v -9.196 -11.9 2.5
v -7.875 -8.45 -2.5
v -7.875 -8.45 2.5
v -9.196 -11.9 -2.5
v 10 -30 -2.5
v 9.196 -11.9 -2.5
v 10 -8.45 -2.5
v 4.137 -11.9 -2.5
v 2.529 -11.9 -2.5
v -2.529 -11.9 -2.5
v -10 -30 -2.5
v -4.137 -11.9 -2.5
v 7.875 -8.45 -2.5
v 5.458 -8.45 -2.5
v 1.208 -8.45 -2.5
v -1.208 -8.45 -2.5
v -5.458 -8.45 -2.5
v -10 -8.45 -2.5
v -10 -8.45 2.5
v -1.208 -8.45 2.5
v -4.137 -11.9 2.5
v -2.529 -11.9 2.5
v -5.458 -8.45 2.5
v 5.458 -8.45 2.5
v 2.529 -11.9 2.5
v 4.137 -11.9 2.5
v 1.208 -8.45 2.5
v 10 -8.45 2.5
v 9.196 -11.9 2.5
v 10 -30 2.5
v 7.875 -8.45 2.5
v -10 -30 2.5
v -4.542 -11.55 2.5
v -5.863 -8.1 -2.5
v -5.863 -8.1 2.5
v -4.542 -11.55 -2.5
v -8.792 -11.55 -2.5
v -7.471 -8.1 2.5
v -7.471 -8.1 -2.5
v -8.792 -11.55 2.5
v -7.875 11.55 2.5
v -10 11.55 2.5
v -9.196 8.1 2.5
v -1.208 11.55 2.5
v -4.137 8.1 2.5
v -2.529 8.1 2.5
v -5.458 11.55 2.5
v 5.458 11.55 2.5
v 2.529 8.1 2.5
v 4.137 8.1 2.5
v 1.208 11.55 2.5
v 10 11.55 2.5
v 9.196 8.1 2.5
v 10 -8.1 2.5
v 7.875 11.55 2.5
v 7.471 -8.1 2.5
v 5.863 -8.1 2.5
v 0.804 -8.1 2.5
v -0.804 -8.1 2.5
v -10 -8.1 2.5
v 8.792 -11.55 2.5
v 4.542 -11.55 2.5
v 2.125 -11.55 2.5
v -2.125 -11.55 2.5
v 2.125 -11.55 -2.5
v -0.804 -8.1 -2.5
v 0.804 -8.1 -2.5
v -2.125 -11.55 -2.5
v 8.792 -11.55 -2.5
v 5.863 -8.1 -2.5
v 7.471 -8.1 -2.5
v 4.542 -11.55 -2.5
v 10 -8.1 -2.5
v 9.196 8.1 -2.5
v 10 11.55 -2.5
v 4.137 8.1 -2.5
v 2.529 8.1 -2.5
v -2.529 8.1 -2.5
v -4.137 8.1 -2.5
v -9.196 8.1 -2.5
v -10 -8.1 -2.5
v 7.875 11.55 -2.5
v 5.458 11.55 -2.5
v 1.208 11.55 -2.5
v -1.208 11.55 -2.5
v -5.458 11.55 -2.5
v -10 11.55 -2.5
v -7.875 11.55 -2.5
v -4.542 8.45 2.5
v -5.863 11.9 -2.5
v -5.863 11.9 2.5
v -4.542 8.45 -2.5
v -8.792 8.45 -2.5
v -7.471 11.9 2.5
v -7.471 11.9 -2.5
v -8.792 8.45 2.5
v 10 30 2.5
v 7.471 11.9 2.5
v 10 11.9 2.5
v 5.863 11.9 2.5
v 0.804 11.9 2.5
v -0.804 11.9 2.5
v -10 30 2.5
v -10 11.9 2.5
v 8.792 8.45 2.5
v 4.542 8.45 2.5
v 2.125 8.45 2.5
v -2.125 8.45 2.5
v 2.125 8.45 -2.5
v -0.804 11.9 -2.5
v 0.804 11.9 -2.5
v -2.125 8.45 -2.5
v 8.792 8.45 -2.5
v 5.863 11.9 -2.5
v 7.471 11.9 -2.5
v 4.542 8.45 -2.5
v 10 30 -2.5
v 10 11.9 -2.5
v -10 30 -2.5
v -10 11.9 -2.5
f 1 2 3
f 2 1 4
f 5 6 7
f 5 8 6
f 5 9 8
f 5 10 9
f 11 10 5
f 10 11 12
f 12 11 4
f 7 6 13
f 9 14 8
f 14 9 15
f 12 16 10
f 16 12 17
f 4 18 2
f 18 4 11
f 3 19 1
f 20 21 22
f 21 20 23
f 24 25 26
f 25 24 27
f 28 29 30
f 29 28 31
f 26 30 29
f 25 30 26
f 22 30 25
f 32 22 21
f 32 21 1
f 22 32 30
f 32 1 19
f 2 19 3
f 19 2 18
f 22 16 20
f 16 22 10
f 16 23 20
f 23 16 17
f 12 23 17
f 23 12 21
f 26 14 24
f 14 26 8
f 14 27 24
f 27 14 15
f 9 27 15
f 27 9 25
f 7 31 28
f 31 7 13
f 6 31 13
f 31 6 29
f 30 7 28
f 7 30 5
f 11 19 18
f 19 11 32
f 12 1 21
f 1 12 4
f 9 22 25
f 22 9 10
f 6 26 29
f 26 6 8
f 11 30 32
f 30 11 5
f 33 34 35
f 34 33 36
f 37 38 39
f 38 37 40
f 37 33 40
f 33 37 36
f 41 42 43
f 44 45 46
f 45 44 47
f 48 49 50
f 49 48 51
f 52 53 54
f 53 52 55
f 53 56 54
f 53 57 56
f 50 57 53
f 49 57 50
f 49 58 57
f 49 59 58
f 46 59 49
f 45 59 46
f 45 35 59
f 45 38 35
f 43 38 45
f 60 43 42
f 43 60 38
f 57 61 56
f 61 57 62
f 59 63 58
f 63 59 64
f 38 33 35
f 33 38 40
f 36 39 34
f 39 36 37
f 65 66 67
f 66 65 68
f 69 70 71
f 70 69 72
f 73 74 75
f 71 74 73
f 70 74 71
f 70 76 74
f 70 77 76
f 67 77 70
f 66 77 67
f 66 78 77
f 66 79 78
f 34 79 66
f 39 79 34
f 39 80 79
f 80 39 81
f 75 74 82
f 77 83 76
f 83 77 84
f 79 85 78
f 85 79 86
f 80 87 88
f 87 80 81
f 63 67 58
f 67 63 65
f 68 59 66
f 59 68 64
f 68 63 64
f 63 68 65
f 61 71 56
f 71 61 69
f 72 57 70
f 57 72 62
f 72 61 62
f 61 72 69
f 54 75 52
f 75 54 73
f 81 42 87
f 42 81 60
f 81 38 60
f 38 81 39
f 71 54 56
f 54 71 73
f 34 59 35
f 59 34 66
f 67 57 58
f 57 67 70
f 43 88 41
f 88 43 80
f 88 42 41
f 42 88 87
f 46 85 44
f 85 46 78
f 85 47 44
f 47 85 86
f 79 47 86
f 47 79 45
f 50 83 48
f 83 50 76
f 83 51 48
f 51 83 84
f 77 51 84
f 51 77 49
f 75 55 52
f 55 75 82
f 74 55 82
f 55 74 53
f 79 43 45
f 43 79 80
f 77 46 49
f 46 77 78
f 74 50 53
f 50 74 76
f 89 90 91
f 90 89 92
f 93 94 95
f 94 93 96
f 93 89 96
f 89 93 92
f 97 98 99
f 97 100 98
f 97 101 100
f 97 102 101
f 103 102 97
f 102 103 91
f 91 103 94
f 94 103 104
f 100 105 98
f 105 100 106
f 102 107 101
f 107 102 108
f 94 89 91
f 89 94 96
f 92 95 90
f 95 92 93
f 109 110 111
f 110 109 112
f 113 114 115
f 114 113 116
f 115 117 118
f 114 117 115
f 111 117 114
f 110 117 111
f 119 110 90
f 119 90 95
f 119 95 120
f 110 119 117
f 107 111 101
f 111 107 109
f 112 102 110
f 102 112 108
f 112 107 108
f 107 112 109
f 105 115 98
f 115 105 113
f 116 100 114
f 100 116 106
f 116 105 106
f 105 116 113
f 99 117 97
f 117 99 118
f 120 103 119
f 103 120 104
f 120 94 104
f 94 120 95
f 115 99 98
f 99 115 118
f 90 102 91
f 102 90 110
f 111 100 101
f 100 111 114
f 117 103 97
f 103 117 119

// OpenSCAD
/**
 *  Dovetail parametric generator for OpenScad
 *  Générateur de queue d'aronde pour OpenScad
 *
 *  Copyright (c) 2012 Charles Rincheval.  All rights reserved.
 *
 *  This library is free software; you can redistribute it and/or
 *  modify it under the terms of the GNU Lesser General Public
 *  License as published by the Free Software Foundation; either
 *  version 2.1 of the License, or (at your option) any later version.
 *
 *  This library is distributed in the hope that it will be useful,
 *  but WITHOUT ANY WARRANTY; without even the implied warranty of
 *  MERCHANTABILITY or FITNESS FOR A PARTICULAR PURPOSE.  See the GNU
 *  Lesser General Public License for more details.
 *
 *  You should have received a copy of the GNU Lesser General Public
 *  License along with this library; if not, write to the Free Software
 *  Foundation, Inc., 51 Franklin St, Fifth Floor, Boston, MA  02110-1301  USA
 *
 *  Last update :
 *  https://github.com/hugokernel/OpenSCAD_Dovetail
 *
 *  http://www.digitalspirit.org/
 */

/**
 *  Create one teeth
 *  @param int width        Teeth width
 *  @param int height       Teeth height
 *  @param int thickness    Teeth thickness
 */
module dovetail_teeth(width, height, thickness) {
    offset = width / 3;
    translate([- width / 2, - height / 2, 0]) {
        linear_extrude(height = thickness) {
            polygon([[0, 0], [width, 0], [width - offset, height], [offset, height]]);
        }
    }
}


/**
 *  Dovetail
 *  @param int  width           Dovetail width
 *  @param int  teeth_count     Teeth count
 *  @param int  teeth_height    Teeth height
 *  @param int  teeth_thickness Teeth thickness
 *  @param int  clear           Teeth clear
 *  @param bool male            Get male (true) or female (false)
 */
module dovetail(width, teeth_count, teeth_height, teeth_thickness, clear = 0.1, male = true) {

    /**
     * 4 sections :
     *
     * |1/2         1/2|
     * |--+ <- 3 -> +--|--+         +--
     * |   \1  1  1/   |   \       /
     * |    \_____/    |    \_____/
     */

    y = ((width - teeth_count * 2 * clear) / teeth_count) / 4;

    compensation = - 0.1;
    teeth_width = y * 3;

    // Always width / 3 (ref. dovetail_teeth())
    offset = teeth_width / 3;
    start_at = clear * 2 + teeth_width / 2 - width / 2 - clear;

    translate([0, 0, - teeth_thickness / 2]) {

        // Debug purpose only
        % union() {
            translate([- width / 2, 0, - width / 2]) cube(size = [width, 0.01, width]);
        }

        for (i = [-1 : teeth_count * 2 - 1] ) {
            x = start_at + y / 2 + (teeth_width - offset + clear) * i;
            if (i % 2) {
                x = x + 0.1;
                translate([x + compensation, - clear, 0]) {
                    rotate([0, 0, 180]) {
                        if (male == true) {
                            dovetail_teeth(teeth_width - clear, teeth_height - clear, teeth_thickness);
                        }
                    }
                }
            } else {
                translate([x, clear, 0]) {
                    if (male == false) {
                        dovetail_teeth(teeth_width - clear, teeth_height - clear, teeth_thickness);
                    }
                }
            }
        }
    }
}

/**
 *  Cut piece
 *  @param vector position  Cut position ([x, y, z])
 *  @param vector dimension Dimension of bounding box ([w, l, h])
 *  @param vector teeths    Teeths parameters ([count, height, clearance])
 *  @param bool   male      Get male (true) or female (false)
 */
module cutter(position, dimension, teeths, male = true) {
    translate(position) {
        dovetail(dimension[0], teeths[0], teeths[1], dimension[2], teeths[2], male);

        if (male) {
            translate([- dimension[0] / 2, - (teeths[1] / 2 - 0.1) - dimension[1], - dimension[2] / 2]) {
                cube(size = dimension);
            }
        } else {
            translate([- dimension[0] / 2, teeths[1] / 2 - 0.1, , - dimension[2] / 2]) {
                cube(size = dimension);
            }
        }
    }
}


module demo() {
    dim = [20, 60, 5];
    clear = 0.3;

    /**
     * [x, y, z]
     * - x : Teeth count
     * - y : Teeth height
     * - z : Teeth Clearance
     */
    teeth = [3, 4, clear];

    % cube(size = dim, center = true);

    color("GREEN") intersection() {
        cube(size = dim, center = true);
        cutter([0, -10, 0], dim, teeth, true);
    }

    //translate([22, 0, 0])
    color("RED") intersection() {
        cube(size = dim, center = true);
        cutter([0, -10, 0], dim, teeth, false);
        cutter([0, 10, 0], dim, teeth, true);
    }

    //translate([44, 0, 0])
    color("BLUE") intersection() {
        cube(size = dim, center = true);
        cutter([0, 10, 0], dim, teeth, false);
    }
}


demo();
